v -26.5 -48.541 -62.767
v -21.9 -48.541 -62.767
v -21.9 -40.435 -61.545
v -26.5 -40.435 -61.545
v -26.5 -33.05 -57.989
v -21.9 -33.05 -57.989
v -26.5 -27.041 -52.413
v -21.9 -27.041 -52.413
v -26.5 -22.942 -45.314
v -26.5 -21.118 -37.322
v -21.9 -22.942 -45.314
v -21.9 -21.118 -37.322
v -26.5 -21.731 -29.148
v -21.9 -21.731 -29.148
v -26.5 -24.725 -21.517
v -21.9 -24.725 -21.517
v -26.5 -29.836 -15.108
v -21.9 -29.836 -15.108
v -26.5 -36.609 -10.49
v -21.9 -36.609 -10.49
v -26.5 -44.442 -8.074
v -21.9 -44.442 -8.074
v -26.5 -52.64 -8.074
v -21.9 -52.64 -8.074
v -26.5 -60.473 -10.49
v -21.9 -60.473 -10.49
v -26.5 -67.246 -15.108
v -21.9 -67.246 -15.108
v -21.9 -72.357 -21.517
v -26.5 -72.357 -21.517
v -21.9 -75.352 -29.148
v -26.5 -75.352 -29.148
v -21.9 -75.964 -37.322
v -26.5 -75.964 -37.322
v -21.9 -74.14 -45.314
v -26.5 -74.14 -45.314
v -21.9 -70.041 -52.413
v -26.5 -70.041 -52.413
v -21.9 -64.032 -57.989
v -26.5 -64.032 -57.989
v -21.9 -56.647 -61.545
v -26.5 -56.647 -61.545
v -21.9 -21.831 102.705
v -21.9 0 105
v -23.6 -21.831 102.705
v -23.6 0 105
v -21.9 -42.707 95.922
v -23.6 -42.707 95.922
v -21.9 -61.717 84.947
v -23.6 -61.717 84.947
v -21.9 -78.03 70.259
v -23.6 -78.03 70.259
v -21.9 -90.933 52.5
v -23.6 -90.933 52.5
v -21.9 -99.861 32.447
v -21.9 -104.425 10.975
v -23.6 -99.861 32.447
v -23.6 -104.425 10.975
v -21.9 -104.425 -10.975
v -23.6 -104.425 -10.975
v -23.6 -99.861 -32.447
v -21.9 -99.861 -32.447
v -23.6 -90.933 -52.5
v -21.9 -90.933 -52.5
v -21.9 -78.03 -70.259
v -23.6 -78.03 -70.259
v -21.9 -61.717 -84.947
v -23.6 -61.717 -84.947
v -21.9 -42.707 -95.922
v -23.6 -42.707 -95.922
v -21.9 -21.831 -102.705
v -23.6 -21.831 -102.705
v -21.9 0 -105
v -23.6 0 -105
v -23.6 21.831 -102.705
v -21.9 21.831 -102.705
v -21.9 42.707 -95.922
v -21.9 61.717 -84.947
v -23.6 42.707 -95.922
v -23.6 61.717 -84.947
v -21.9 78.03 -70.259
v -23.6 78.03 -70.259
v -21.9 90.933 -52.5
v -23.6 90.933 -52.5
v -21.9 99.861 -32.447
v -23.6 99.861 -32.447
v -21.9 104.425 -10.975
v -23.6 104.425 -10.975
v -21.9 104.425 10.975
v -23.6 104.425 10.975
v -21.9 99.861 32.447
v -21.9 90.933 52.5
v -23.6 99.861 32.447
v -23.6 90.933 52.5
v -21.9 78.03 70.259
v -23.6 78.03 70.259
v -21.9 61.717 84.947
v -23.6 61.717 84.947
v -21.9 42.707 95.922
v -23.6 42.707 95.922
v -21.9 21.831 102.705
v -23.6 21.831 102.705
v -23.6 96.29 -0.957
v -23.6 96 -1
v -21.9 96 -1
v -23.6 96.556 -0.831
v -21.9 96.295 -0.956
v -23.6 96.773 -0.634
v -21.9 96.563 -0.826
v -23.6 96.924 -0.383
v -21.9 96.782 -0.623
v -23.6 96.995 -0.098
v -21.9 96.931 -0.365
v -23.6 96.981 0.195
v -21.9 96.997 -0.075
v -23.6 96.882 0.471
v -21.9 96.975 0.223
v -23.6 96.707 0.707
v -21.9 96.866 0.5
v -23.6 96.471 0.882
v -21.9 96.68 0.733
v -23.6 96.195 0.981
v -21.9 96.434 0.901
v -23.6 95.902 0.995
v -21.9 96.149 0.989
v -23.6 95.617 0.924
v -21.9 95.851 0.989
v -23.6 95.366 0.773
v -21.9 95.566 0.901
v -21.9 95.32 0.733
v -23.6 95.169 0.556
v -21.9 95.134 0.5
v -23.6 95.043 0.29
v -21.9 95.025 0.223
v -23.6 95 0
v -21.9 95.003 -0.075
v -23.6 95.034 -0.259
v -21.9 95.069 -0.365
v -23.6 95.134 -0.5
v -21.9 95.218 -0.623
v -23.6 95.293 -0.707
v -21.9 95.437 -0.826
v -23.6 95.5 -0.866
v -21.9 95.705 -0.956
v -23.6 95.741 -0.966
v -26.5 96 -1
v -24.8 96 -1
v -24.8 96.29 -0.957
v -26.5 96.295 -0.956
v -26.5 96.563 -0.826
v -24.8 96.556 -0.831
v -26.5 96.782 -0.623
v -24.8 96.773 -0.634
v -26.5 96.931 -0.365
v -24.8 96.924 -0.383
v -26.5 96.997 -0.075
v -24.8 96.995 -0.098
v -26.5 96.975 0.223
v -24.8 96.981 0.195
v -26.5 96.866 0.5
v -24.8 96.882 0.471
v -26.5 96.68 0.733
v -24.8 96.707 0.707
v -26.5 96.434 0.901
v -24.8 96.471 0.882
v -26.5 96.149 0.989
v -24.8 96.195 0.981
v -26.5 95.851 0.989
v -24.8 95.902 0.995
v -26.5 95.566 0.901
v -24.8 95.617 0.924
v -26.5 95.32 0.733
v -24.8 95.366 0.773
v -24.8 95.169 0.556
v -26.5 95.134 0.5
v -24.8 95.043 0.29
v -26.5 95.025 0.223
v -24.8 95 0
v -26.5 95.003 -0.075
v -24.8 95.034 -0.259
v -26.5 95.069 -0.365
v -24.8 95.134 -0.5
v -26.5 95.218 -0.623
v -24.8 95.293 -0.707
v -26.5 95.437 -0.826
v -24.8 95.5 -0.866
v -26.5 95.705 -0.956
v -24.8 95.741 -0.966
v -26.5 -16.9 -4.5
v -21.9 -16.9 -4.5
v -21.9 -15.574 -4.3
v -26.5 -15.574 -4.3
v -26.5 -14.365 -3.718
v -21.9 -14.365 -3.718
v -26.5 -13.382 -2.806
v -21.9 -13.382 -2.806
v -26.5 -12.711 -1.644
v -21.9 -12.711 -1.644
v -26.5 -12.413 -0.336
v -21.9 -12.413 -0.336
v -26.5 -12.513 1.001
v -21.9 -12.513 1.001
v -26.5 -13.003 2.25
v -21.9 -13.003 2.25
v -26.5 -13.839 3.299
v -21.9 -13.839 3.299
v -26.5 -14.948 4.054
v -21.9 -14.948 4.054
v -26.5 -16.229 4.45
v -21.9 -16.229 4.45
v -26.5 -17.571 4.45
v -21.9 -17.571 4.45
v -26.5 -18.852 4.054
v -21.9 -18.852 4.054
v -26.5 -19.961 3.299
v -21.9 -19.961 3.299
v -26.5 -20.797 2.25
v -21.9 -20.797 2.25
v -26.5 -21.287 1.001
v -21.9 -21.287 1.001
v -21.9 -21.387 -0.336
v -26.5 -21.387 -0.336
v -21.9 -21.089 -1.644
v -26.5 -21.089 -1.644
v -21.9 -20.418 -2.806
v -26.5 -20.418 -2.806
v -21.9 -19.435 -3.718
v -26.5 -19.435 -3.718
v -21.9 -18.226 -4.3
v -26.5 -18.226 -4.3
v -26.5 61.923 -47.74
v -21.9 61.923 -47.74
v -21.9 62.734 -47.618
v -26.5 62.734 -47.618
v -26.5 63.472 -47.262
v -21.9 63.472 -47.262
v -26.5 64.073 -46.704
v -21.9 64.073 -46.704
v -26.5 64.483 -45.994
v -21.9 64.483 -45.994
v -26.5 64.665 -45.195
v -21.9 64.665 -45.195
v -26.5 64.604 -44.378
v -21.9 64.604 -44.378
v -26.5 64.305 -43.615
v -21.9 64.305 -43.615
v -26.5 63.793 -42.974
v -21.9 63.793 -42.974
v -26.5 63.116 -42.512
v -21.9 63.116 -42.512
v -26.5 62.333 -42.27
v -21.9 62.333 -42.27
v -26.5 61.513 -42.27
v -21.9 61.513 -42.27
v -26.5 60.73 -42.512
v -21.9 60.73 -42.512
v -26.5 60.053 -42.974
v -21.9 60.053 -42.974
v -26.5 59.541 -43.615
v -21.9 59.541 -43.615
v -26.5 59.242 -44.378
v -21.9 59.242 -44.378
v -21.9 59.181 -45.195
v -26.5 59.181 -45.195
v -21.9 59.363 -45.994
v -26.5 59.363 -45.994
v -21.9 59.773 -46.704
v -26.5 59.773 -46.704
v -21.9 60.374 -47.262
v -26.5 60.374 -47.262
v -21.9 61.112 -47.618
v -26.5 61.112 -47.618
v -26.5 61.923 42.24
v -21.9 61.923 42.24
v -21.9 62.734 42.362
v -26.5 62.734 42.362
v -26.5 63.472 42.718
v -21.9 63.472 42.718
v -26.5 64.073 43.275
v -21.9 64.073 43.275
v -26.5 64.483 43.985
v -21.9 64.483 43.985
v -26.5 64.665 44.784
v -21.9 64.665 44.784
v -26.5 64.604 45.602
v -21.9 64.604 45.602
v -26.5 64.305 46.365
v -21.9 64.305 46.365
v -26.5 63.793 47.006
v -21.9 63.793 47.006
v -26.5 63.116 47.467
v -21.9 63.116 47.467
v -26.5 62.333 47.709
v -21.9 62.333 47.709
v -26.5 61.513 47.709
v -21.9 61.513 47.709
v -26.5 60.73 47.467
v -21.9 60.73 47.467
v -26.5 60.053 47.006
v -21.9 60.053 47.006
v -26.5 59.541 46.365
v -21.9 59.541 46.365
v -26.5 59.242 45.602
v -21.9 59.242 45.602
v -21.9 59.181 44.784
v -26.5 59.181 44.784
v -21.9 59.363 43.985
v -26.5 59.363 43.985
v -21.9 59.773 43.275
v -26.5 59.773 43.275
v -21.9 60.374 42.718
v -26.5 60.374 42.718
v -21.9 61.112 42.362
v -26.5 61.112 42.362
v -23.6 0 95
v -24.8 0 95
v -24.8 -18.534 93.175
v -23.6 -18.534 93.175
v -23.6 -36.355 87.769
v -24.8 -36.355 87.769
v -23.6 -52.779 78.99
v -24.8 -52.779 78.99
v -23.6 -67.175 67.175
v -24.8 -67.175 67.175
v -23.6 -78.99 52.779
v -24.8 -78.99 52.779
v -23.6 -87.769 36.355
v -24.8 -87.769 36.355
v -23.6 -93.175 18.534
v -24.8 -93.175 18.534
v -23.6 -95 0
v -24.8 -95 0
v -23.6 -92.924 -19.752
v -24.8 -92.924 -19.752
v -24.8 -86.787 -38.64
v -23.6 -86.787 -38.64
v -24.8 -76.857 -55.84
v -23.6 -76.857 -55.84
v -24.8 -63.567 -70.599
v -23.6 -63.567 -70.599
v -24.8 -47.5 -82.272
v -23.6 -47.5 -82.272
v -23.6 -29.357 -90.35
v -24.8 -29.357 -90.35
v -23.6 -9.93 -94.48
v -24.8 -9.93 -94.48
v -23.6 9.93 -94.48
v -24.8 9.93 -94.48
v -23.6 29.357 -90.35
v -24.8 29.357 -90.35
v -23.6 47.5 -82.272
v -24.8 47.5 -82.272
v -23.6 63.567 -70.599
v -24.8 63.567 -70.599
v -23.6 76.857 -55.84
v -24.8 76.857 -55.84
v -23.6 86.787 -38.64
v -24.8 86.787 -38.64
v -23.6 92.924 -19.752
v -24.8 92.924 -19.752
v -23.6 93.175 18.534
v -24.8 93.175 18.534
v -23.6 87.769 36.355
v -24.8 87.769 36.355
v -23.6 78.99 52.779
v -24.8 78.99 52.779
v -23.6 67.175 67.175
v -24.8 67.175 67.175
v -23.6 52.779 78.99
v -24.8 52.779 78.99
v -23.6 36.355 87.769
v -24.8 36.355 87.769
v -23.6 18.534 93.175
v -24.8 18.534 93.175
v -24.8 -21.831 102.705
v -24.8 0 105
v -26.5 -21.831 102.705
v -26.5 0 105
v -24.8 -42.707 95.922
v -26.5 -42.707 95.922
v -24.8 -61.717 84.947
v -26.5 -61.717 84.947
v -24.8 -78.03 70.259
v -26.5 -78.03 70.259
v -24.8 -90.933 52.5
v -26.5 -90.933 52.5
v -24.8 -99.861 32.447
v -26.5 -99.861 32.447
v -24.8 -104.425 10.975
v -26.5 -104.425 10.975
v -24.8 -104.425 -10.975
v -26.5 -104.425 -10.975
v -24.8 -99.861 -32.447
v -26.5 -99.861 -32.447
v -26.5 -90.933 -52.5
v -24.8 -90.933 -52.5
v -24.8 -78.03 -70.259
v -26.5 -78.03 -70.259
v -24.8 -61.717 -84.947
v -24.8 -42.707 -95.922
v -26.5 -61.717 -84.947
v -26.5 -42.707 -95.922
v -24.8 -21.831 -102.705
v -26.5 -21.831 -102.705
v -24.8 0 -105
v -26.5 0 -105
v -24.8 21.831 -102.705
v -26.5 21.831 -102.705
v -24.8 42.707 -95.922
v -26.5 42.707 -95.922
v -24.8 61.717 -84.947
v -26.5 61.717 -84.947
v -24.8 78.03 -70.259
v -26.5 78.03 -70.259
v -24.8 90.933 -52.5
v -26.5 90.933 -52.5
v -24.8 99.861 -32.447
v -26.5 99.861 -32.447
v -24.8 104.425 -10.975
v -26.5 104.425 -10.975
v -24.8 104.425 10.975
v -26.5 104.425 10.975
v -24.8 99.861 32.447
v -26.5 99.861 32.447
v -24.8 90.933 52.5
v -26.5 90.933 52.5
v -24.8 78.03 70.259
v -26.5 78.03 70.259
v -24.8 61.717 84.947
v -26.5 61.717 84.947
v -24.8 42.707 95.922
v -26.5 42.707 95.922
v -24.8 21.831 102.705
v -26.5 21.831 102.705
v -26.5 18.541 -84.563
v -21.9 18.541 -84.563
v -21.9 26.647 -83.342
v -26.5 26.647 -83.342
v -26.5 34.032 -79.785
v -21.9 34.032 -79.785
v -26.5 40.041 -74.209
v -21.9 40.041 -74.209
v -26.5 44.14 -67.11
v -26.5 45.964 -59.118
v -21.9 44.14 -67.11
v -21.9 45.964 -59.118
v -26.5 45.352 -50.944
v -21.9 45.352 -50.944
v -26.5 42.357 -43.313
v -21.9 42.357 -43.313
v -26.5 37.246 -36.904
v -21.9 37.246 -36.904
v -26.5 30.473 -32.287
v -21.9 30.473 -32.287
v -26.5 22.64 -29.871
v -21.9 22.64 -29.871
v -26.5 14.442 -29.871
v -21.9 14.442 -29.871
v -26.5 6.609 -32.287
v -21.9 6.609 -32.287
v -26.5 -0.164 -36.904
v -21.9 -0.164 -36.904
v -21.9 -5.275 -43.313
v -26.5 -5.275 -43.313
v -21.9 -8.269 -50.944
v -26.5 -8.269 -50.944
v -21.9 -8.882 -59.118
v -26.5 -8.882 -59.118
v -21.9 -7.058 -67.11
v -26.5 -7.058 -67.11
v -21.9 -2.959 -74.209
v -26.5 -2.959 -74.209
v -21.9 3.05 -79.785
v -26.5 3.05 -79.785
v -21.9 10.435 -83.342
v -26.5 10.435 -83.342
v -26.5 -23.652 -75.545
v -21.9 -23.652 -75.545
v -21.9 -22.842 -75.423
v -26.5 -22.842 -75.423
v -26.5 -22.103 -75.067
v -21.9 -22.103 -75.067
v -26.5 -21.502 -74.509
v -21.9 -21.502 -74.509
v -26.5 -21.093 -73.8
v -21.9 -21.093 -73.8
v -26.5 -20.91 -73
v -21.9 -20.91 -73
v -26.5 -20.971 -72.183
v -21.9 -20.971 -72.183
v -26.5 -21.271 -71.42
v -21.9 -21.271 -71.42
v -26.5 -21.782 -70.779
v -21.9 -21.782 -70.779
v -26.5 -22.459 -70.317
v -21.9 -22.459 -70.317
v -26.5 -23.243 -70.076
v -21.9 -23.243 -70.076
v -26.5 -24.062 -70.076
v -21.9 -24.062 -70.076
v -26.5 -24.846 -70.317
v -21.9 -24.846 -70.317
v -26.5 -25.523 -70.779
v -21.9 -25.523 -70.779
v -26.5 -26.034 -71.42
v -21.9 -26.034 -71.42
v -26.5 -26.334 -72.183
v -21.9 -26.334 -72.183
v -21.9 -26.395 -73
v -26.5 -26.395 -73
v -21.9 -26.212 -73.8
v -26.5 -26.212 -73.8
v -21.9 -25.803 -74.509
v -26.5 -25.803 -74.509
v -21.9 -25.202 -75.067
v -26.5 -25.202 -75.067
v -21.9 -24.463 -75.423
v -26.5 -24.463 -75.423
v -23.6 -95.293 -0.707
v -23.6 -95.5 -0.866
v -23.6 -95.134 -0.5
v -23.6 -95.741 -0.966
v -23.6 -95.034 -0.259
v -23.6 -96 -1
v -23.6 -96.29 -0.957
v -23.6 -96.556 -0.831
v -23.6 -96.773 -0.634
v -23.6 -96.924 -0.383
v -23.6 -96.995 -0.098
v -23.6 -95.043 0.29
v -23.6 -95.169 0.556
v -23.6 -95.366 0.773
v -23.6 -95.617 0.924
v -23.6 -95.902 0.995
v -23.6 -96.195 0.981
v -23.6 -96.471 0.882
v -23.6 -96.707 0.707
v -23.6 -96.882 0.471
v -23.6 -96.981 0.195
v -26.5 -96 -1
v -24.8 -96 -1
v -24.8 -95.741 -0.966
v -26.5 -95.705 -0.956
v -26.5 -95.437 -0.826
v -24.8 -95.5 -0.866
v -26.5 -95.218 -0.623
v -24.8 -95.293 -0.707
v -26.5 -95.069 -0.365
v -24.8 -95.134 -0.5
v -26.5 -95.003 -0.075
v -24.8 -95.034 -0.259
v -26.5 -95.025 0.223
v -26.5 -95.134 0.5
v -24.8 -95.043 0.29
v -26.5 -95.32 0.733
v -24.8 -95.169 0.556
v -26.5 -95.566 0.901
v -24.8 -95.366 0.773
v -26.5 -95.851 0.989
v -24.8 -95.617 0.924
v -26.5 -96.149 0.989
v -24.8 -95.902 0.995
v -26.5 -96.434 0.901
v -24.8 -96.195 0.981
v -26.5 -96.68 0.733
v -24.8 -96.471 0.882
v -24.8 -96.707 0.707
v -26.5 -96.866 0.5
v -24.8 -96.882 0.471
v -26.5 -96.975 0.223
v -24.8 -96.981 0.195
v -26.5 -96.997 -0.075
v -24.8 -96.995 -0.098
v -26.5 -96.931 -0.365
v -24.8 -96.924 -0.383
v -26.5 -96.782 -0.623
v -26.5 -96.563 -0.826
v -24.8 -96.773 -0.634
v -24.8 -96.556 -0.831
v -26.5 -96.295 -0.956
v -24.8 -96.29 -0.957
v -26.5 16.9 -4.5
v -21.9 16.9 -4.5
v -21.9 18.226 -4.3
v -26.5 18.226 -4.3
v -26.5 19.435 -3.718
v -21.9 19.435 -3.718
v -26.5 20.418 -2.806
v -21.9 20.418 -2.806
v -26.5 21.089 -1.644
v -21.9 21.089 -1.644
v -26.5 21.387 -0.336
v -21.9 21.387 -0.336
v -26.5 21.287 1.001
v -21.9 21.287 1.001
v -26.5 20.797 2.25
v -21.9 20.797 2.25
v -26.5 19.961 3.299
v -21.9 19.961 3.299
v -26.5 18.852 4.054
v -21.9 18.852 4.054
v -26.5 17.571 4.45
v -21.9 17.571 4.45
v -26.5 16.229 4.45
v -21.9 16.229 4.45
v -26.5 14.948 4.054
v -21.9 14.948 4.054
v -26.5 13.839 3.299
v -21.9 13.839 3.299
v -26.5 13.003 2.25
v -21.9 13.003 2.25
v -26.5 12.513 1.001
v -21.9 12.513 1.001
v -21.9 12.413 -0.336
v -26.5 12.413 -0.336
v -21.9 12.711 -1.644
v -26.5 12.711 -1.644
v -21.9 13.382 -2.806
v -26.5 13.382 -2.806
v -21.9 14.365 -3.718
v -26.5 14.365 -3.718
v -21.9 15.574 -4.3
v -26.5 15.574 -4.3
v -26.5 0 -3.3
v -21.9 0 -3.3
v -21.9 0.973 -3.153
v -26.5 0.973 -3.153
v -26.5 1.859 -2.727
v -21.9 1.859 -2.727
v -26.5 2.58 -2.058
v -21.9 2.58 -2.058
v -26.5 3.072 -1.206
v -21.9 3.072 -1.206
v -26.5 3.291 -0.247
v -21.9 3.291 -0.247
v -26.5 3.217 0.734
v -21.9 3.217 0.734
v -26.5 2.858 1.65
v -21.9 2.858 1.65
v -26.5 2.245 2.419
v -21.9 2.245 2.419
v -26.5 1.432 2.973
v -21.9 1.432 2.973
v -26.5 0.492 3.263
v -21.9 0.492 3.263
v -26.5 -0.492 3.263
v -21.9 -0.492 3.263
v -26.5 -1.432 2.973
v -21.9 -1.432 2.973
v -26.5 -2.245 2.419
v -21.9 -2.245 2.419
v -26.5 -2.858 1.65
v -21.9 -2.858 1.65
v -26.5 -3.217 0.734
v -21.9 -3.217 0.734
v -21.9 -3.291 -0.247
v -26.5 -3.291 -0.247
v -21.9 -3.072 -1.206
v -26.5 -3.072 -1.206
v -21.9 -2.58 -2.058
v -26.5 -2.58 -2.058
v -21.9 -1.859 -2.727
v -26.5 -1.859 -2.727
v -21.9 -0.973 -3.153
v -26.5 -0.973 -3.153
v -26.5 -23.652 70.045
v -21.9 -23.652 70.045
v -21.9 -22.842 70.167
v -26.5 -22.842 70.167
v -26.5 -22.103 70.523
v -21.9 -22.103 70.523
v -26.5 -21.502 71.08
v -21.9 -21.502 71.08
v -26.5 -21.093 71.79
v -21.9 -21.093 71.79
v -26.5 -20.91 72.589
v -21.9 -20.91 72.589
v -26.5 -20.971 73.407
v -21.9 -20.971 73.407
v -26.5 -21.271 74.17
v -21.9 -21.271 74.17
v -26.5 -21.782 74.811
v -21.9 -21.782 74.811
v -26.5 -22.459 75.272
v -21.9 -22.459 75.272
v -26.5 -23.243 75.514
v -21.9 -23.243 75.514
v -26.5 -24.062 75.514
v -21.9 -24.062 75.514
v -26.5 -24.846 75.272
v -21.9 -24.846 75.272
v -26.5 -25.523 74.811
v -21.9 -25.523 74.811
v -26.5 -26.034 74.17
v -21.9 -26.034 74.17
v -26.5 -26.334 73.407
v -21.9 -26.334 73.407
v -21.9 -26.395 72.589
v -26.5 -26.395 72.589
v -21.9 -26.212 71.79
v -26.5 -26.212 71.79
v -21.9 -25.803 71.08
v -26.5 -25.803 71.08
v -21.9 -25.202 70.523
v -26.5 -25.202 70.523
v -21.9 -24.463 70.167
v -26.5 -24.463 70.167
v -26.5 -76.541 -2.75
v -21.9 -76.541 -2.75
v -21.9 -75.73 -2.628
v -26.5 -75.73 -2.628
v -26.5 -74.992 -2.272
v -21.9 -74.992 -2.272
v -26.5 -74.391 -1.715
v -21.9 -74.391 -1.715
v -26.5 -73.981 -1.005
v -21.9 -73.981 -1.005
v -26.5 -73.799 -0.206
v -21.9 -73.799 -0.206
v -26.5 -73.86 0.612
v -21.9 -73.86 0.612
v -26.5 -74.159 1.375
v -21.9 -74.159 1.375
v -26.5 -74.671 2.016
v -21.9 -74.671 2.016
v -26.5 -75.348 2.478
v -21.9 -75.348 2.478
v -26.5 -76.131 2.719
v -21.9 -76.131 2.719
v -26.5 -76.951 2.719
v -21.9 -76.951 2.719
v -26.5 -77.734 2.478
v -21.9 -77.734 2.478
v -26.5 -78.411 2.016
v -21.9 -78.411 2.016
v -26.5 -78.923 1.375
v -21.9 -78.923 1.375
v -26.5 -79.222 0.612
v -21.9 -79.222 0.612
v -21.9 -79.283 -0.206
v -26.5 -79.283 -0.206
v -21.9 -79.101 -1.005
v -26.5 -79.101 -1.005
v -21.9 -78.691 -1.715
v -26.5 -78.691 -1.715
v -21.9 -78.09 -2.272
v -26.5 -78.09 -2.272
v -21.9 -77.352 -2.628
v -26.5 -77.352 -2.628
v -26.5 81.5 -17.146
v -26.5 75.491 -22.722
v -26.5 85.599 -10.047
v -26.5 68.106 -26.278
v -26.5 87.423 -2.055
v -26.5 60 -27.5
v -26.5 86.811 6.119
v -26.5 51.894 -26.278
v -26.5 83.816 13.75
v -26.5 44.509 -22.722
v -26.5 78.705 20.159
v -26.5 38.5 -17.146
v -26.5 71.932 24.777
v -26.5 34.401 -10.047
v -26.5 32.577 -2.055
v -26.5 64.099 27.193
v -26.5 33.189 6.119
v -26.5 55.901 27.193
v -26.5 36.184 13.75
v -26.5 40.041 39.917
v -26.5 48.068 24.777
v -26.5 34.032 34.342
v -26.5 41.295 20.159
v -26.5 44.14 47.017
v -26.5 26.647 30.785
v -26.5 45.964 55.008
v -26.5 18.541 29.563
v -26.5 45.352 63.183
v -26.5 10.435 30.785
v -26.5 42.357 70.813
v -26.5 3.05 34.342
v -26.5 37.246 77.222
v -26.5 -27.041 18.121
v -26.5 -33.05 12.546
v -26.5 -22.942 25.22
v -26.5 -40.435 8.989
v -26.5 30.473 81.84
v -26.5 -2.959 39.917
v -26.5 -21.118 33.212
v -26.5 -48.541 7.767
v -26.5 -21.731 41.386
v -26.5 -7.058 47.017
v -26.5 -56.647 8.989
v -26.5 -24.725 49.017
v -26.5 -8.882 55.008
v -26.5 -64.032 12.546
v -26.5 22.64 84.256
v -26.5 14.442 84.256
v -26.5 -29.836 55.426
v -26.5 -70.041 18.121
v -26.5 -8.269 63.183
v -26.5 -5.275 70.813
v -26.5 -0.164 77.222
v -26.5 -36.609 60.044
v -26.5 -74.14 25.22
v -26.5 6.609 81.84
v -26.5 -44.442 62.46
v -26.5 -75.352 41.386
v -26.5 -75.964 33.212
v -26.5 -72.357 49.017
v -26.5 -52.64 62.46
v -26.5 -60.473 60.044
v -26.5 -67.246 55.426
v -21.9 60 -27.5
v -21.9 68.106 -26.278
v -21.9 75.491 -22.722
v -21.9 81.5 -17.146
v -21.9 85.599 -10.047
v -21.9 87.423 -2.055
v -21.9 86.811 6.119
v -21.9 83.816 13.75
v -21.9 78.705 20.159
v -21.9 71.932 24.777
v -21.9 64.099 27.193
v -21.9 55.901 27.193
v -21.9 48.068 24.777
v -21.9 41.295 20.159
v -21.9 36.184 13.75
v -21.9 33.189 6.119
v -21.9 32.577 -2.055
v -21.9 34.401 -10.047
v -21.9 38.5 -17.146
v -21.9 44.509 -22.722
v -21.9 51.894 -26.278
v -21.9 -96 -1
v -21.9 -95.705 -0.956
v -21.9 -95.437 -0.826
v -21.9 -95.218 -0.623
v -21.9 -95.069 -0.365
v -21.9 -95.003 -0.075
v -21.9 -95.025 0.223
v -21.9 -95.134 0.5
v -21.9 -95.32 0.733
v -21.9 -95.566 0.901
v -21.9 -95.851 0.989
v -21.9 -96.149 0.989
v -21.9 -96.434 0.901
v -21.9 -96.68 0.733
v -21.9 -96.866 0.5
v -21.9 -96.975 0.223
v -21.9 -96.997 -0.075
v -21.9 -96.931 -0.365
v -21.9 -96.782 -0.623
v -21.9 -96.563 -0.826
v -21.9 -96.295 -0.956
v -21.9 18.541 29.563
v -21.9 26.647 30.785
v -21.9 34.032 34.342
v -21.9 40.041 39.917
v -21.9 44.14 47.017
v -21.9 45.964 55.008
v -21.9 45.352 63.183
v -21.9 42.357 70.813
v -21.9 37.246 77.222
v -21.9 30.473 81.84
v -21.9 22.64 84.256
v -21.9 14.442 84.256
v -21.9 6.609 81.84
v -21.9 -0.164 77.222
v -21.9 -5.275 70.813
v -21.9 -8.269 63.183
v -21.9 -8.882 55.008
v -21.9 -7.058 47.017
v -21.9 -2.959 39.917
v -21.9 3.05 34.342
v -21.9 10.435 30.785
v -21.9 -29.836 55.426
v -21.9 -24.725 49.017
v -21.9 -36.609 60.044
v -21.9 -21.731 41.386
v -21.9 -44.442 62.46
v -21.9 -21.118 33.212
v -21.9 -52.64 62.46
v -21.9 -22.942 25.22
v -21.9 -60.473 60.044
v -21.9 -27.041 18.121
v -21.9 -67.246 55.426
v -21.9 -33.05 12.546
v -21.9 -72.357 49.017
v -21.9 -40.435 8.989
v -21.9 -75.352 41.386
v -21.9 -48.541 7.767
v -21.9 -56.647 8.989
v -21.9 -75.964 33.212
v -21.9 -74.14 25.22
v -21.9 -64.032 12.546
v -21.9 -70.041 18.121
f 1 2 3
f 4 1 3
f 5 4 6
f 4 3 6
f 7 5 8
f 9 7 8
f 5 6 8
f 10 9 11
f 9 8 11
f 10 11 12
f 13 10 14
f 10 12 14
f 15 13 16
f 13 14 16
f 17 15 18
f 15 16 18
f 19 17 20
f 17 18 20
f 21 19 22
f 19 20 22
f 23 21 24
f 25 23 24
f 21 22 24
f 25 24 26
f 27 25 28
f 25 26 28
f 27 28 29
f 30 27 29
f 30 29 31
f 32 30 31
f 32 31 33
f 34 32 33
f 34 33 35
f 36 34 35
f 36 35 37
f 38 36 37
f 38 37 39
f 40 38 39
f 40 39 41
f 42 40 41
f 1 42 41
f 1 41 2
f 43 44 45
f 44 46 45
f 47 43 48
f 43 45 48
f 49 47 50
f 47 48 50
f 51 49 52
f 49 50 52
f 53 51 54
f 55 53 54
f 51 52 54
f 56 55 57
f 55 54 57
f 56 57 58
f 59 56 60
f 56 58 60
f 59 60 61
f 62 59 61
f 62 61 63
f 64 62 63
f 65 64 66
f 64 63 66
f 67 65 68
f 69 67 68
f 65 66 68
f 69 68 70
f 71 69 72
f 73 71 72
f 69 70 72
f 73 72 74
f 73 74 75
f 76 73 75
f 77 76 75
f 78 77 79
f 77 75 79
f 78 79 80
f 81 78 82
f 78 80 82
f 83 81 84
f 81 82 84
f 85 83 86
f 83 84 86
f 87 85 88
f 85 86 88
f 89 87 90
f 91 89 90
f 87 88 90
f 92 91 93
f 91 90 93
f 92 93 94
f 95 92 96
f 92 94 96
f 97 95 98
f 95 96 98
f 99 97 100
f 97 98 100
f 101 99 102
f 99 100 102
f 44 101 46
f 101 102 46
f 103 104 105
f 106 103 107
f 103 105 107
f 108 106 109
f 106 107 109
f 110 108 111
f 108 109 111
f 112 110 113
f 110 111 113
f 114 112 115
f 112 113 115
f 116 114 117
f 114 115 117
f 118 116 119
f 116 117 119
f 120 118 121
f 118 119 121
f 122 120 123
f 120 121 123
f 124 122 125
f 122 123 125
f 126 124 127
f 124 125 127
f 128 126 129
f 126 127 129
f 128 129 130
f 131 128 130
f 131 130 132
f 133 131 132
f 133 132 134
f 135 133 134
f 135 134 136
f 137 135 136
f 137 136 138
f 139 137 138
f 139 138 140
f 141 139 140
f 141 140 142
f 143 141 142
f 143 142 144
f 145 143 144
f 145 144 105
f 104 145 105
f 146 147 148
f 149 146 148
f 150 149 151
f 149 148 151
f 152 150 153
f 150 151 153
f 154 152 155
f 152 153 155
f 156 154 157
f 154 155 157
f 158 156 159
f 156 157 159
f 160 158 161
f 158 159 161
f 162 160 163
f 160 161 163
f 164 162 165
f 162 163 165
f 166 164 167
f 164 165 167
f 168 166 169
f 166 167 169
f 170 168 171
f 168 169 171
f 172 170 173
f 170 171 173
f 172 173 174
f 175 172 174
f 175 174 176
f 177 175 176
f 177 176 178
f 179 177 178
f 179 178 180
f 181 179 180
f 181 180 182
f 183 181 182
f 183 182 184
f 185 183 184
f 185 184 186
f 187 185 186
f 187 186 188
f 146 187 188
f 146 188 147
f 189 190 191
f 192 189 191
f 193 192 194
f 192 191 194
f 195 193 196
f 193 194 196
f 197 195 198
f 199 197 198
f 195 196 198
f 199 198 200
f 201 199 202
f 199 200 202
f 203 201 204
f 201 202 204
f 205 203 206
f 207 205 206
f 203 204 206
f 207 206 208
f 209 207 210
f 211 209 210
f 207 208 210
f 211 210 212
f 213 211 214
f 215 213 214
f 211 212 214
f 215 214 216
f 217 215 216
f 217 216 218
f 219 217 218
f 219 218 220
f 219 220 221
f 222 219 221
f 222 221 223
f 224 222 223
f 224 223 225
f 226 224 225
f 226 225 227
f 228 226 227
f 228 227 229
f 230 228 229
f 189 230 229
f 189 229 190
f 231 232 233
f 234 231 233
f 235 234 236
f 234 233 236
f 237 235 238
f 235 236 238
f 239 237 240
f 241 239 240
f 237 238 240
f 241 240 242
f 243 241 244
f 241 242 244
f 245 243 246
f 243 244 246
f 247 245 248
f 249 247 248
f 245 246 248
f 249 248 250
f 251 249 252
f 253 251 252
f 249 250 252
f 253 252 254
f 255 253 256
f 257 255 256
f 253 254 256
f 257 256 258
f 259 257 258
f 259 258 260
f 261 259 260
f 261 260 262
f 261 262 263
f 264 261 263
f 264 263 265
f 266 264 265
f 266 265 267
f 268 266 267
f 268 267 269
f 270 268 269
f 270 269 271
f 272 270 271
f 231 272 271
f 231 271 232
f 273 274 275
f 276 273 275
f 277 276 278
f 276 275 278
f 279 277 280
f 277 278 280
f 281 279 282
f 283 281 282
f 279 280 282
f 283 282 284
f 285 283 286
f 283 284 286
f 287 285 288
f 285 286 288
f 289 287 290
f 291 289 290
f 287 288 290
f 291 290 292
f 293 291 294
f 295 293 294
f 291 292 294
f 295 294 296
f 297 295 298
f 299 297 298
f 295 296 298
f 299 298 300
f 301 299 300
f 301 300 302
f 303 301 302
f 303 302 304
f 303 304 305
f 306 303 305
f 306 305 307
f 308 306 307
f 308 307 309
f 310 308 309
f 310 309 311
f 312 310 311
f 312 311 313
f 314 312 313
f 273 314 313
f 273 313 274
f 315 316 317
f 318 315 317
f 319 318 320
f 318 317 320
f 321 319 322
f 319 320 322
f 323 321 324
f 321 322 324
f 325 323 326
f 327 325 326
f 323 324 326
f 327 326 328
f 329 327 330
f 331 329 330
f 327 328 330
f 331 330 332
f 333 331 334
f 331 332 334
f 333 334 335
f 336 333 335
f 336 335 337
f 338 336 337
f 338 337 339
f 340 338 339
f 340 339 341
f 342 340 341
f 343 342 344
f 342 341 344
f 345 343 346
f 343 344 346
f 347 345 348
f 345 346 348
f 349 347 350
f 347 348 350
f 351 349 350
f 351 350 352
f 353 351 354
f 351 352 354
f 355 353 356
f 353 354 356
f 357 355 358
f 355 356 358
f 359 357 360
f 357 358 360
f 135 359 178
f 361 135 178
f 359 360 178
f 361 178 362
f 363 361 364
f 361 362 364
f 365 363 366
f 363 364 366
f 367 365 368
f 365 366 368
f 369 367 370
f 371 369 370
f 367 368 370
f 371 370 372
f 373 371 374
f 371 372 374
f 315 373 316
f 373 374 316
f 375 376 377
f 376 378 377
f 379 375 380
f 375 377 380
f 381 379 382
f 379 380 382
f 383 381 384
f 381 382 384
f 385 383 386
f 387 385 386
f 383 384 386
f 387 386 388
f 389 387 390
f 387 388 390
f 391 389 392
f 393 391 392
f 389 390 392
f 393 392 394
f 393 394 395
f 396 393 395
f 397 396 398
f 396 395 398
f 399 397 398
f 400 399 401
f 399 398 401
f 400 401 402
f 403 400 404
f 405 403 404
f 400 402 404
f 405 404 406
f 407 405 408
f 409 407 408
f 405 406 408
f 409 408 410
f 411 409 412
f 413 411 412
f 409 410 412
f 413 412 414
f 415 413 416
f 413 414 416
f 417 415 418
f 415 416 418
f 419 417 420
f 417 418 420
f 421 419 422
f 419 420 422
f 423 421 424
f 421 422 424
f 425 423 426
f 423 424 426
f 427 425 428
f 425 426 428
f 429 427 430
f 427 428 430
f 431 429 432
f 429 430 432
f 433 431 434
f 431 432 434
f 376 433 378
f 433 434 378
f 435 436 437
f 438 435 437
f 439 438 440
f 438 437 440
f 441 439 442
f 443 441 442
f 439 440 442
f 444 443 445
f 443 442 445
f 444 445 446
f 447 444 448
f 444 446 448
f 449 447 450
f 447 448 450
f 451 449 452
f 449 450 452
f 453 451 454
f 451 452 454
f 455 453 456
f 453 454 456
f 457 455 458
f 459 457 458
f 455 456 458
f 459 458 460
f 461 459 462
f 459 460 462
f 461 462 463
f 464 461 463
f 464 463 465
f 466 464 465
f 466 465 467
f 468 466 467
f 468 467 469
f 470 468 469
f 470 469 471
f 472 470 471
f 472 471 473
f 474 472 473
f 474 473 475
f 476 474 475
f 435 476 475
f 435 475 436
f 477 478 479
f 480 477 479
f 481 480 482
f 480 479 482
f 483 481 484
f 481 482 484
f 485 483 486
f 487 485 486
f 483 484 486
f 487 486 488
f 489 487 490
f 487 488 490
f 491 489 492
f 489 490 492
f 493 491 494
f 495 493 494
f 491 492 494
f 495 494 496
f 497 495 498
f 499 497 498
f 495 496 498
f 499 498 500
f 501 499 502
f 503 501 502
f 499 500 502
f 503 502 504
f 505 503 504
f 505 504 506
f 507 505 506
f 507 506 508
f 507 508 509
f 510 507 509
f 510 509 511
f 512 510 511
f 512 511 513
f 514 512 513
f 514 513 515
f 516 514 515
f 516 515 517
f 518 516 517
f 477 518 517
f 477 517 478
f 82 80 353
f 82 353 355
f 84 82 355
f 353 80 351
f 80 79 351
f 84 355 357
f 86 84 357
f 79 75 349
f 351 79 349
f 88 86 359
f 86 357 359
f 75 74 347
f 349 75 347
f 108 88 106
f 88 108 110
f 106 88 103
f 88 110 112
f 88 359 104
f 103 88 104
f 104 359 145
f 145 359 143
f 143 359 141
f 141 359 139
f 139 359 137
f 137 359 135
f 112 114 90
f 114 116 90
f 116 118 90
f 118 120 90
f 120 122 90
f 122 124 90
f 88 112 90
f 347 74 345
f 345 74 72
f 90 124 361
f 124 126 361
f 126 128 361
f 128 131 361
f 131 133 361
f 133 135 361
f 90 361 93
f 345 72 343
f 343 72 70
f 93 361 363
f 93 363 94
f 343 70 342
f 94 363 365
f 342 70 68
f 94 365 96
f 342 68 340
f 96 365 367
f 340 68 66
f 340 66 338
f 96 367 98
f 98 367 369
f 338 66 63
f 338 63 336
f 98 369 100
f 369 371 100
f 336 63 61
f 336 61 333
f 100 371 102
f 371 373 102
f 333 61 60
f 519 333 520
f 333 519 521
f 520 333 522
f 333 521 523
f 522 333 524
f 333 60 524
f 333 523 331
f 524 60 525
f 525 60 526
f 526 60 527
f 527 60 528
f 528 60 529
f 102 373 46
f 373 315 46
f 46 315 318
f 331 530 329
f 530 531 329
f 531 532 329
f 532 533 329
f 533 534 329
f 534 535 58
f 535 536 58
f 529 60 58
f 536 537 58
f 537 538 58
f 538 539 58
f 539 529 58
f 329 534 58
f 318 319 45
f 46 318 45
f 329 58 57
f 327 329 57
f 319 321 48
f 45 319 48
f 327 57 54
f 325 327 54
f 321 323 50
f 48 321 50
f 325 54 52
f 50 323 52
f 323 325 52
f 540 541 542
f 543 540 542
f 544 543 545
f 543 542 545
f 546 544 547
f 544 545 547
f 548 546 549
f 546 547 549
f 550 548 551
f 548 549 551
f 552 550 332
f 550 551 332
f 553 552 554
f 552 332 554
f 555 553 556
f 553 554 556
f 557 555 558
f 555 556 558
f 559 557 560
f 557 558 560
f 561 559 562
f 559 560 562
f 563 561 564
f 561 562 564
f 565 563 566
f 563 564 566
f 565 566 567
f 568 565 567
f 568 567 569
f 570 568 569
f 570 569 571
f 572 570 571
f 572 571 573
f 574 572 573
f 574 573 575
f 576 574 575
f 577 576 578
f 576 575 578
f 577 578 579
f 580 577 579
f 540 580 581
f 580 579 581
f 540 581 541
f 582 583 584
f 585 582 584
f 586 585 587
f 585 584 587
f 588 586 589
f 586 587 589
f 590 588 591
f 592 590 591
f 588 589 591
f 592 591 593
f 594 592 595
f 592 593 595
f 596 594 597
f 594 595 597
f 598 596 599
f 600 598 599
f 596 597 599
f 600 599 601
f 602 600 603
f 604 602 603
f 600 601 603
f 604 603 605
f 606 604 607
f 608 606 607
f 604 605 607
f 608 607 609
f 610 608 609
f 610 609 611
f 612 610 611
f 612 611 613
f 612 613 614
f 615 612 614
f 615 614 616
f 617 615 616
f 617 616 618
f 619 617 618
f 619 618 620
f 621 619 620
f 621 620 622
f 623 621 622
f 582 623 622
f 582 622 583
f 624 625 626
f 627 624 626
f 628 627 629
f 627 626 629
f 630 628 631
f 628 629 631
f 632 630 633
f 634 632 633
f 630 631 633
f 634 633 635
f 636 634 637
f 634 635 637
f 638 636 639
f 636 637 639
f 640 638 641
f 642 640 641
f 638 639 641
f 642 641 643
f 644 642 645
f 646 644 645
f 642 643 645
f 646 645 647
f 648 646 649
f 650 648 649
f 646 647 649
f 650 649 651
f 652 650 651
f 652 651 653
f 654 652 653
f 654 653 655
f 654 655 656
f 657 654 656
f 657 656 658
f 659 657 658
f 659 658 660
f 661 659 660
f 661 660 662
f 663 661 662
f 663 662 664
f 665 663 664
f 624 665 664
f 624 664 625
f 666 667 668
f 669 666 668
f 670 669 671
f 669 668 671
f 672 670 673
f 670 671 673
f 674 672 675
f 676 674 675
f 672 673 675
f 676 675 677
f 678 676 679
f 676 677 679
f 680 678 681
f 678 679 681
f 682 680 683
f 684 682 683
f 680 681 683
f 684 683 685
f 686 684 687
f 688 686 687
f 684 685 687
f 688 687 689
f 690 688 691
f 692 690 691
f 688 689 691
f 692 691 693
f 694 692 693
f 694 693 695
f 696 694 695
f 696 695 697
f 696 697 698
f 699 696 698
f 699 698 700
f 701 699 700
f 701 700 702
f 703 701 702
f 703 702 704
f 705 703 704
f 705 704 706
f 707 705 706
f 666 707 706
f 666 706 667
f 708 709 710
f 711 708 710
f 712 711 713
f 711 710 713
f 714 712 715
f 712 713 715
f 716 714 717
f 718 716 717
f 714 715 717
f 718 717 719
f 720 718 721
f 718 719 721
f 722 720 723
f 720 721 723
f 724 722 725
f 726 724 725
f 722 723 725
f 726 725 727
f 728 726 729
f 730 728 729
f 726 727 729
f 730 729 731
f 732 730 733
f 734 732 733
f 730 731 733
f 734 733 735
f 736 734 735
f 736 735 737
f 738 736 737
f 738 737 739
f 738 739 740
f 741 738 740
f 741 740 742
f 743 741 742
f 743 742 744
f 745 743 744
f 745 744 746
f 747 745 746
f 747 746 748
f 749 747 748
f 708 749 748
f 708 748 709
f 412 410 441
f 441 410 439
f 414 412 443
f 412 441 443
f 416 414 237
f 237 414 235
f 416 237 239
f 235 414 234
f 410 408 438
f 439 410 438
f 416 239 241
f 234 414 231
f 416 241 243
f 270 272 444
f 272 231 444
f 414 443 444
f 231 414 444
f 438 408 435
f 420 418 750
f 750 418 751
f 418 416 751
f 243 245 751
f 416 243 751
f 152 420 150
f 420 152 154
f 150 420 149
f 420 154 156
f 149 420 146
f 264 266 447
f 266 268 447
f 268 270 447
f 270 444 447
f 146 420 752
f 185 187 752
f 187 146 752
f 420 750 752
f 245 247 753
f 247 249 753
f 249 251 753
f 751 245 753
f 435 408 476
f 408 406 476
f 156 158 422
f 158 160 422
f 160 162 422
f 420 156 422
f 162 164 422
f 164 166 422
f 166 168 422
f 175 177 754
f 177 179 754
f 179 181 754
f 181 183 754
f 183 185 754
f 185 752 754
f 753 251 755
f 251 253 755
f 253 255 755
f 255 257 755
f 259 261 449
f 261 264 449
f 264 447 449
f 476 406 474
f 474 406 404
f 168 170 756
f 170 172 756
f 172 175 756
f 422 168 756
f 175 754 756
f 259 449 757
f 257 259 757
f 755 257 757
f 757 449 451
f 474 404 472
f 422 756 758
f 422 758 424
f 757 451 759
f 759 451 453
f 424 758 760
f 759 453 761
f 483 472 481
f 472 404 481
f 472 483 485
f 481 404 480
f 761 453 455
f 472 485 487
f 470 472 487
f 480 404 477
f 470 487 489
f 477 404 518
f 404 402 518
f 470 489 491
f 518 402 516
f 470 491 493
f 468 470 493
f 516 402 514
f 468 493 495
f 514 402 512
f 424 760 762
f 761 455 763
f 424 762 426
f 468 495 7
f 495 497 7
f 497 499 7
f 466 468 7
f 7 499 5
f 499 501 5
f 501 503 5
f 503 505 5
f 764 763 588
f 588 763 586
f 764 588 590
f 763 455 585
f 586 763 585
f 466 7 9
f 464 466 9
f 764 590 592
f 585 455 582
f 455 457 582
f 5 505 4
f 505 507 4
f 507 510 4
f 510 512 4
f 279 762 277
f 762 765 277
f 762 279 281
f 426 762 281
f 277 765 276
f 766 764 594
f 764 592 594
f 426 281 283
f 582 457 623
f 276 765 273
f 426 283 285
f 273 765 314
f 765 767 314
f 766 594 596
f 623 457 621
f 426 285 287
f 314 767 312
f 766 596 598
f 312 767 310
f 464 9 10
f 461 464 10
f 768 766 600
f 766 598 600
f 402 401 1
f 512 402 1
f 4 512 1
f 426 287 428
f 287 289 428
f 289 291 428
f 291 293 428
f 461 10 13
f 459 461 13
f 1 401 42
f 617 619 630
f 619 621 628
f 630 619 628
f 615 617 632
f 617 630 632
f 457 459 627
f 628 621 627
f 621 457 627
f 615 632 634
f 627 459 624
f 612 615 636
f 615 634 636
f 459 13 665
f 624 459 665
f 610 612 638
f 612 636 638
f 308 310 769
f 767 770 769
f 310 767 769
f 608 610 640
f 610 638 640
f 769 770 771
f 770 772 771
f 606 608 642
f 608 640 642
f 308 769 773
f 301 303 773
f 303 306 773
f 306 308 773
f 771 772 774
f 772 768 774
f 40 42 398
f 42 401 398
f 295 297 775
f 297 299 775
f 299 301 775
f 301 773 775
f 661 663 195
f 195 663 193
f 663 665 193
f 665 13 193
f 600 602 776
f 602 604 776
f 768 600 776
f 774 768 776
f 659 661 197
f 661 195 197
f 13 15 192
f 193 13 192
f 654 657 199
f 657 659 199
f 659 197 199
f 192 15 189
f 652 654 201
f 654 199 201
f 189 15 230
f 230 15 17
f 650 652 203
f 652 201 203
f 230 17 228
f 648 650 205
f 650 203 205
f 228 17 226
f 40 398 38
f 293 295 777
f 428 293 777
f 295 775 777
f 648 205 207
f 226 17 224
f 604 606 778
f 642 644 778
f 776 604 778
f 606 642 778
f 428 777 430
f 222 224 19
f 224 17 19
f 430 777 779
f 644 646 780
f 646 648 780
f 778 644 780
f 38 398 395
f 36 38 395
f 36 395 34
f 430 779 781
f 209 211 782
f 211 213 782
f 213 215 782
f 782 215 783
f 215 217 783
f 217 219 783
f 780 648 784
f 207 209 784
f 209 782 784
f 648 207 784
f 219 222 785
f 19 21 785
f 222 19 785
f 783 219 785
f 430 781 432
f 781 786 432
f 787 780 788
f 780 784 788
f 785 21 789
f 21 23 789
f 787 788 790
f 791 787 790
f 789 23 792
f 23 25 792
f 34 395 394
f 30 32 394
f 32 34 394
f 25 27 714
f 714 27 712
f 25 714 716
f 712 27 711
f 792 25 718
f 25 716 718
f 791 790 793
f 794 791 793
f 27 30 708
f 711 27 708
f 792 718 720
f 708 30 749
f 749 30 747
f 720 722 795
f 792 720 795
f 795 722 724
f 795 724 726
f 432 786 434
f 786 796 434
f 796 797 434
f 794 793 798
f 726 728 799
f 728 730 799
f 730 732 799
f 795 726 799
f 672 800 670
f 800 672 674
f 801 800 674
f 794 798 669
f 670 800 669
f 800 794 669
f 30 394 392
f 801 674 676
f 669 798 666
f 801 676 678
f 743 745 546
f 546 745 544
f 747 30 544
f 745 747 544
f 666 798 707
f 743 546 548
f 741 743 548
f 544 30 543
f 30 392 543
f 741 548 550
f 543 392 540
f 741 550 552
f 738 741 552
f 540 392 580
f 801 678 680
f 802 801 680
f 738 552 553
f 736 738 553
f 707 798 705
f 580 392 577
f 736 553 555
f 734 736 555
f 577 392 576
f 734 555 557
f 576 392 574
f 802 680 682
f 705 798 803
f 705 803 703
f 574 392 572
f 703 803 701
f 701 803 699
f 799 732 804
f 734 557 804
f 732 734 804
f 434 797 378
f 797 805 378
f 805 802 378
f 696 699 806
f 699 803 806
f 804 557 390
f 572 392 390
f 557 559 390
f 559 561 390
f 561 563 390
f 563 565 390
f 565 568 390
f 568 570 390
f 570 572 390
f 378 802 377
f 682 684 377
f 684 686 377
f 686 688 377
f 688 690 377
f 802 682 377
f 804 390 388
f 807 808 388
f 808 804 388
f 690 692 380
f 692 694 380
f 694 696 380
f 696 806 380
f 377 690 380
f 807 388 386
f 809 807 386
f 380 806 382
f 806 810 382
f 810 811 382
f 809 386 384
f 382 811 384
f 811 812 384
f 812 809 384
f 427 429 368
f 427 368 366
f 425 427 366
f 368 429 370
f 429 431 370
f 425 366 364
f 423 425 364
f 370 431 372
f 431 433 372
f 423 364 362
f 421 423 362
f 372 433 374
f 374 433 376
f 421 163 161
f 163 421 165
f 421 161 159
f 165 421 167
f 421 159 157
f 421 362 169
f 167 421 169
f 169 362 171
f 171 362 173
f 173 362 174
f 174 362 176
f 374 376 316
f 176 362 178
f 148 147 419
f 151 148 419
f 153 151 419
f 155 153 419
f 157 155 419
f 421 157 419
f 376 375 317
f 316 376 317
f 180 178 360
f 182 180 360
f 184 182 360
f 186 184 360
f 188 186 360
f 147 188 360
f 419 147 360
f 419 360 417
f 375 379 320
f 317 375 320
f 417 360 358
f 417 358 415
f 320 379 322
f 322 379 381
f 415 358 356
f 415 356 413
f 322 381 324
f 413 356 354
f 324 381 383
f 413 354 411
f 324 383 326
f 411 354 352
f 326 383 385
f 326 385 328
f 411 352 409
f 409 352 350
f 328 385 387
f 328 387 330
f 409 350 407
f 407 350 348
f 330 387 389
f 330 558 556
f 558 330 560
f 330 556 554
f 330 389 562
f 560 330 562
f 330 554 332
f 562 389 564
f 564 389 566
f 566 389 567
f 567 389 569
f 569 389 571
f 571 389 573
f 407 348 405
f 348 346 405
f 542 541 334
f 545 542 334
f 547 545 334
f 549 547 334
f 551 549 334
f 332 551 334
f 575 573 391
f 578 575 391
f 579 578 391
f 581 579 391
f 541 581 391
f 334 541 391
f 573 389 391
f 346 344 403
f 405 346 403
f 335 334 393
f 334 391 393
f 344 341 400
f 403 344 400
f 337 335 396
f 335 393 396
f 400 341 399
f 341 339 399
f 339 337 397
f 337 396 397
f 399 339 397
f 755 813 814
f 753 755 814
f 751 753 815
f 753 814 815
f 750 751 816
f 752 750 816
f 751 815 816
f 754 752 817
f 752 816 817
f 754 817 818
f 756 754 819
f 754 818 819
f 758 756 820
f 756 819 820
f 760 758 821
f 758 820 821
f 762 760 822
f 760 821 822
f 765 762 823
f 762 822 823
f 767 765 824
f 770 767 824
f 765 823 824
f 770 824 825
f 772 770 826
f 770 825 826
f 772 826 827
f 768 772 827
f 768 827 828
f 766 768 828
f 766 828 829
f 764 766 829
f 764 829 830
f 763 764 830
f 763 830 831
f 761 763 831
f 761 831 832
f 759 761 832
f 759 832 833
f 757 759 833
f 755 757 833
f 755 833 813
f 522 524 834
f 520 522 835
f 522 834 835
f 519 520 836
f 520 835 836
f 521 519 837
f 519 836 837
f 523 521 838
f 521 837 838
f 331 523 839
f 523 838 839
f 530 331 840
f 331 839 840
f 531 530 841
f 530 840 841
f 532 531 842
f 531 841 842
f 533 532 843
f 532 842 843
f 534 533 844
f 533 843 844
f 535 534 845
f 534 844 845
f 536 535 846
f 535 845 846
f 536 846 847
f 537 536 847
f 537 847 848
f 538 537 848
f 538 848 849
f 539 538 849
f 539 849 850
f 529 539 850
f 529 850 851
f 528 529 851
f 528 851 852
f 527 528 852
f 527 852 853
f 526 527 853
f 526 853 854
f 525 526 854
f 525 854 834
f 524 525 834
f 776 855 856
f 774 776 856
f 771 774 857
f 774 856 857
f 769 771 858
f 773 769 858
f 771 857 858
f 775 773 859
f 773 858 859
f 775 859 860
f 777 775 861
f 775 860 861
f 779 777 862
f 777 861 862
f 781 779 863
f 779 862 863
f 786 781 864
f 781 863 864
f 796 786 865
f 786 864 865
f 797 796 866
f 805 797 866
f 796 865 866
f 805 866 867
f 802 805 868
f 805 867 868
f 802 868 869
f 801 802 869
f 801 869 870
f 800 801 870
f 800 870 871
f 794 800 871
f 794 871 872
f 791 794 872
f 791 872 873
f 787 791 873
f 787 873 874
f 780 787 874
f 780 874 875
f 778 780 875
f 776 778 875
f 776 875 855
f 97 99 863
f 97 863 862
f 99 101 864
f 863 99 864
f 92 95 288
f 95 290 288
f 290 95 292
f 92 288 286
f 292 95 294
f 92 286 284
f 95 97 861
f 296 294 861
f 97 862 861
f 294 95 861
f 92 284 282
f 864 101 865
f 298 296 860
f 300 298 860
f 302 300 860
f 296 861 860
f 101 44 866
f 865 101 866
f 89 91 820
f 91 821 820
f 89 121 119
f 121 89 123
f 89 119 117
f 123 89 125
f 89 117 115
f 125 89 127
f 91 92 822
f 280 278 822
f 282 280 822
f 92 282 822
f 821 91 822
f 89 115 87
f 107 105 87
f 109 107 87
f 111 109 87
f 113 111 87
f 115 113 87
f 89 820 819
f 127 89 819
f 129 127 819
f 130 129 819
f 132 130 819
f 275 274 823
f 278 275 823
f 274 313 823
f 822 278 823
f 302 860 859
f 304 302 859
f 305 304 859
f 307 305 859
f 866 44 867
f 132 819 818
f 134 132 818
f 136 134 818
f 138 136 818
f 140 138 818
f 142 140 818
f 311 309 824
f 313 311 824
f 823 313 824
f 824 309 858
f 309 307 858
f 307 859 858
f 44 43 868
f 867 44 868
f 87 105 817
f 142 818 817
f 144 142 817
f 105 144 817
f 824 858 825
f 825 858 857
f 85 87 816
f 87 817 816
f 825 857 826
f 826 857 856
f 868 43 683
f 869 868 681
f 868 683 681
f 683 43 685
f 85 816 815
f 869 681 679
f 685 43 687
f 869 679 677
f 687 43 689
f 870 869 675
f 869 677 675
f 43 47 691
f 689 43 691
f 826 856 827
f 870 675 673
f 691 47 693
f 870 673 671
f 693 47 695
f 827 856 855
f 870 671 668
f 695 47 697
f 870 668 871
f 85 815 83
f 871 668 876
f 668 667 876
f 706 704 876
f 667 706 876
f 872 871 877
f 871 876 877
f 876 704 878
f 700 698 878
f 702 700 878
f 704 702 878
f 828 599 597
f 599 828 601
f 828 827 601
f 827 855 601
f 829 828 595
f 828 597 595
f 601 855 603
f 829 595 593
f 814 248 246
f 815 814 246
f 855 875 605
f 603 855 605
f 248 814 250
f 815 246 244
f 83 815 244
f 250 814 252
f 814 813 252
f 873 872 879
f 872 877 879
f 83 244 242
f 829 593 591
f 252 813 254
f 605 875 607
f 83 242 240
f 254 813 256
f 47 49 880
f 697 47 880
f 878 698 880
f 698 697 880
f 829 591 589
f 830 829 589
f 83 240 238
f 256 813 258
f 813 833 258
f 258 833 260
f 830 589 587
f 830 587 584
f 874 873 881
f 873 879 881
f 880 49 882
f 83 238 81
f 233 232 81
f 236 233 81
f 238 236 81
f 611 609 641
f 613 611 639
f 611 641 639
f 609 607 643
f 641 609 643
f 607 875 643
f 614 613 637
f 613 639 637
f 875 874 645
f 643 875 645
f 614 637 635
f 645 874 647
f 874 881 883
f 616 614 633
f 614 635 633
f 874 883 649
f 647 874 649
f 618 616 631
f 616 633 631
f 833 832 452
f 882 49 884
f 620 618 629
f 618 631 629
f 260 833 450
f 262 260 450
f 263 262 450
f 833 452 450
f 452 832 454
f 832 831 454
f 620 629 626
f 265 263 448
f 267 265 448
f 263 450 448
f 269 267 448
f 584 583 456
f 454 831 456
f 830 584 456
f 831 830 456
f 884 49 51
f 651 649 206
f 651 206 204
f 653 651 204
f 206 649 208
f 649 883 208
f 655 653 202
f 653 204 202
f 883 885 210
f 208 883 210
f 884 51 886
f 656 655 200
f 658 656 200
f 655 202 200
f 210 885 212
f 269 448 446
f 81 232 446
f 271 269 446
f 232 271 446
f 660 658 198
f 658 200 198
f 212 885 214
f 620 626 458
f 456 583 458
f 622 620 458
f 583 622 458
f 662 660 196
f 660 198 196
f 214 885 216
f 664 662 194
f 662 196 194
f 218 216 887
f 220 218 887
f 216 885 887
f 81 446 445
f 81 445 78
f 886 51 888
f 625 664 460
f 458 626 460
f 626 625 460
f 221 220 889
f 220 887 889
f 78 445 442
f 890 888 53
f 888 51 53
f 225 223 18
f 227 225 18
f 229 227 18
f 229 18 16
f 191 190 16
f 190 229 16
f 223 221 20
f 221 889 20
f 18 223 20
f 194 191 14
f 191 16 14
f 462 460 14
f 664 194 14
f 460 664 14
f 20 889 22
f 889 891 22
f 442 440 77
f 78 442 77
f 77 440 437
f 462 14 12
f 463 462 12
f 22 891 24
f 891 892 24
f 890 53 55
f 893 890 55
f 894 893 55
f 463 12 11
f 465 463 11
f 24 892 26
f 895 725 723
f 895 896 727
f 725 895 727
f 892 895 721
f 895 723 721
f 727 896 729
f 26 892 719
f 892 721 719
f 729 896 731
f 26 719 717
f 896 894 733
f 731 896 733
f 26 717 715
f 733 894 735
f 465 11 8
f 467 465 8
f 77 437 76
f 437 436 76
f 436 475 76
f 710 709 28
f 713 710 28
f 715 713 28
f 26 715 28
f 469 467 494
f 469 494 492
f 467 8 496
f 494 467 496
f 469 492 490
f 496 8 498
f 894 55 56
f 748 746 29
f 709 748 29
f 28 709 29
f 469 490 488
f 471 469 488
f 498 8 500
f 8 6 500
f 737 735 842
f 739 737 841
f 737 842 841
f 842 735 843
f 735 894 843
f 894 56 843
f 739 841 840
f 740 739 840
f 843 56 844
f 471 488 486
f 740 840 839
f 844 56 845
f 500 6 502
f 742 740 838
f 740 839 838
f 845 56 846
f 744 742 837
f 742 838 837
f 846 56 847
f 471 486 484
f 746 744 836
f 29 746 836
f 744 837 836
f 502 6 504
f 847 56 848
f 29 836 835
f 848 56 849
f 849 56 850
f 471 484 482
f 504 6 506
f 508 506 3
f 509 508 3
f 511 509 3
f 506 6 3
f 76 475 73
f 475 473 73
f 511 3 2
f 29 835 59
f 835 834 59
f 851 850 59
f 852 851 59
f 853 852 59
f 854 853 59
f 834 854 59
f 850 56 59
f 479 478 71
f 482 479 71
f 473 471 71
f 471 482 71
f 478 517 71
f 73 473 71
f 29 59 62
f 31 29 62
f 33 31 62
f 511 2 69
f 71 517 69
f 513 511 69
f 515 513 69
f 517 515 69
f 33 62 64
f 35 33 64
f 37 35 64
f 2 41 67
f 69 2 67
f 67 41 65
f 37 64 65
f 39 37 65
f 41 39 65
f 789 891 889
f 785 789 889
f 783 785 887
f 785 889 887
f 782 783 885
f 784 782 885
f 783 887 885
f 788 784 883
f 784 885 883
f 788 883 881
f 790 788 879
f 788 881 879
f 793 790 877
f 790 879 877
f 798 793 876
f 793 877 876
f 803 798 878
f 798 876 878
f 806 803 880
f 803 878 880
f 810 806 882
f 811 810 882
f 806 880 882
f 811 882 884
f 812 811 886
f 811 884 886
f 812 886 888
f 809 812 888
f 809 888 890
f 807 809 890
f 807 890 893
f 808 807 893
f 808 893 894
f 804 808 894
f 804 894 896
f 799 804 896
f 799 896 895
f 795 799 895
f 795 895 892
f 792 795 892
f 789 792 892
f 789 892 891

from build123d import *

# Parameters (mm, degrees)
SKETCH_22_R         = 3.3
SKETCH_22_R_2       = 4.5
SKETCH_22_R_3       = 1
SKETCH_22_R_4       = 27.5
SKETCH_22_R_5       = 2.75
CUT_EXTRUDE_1_DEPTH = 10


with BuildPart() as part:
    # 草图1 → 旋转1 (revolve)
    with BuildSketch(Plane.XY, mode=Mode.PRIVATE) as revolve_1_sk:
        Polygon((-21.9, 11), (-21.9, 25), (-21.9, 105), (-23, 105), (-23.6, 105), (-23.6, 95), (-24.2, 95), (-24.8, 95), (-24.8, 105), (-25, 105), (-26.5, 105), (-26.5, 98.307417596), (-26.5, 11), (-26.5, 0), (-21.9, 0), align=None)
    revolve(revolve_1_sk.sketch.rotate(Axis((-21, 0, 0), (1, 0, 0)), 90), axis=Axis((-21, 0, 0), (1, 0, 0)))

    # 草图22 → 切除-拉伸1 (cut)
    with BuildSketch(Plane(origin=(-21.9, 0, 0), x_dir=(0, 0, -1), z_dir=(1, 0, 0))):
        Circle(SKETCH_22_R)
        with Locations((0, 16.9)):
            Circle(SKETCH_22_R_2)
        with Locations((0, 96)):
            Circle(SKETCH_22_R_3)
        with Locations((0, 60)):
            Circle(SKETCH_22_R_4)
        with Locations((0, -16.9)):
            Circle(SKETCH_22_R_2)
        with Locations((57.063390978, 18.541019662)):
            Circle(SKETCH_22_R_4)
        with Locations((72.794835514, -23.652475842)):
            Circle(SKETCH_22_R_5)
        with Locations((35.267115138, -48.541019662)):
            Circle(SKETCH_22_R_4)
        with Locations((-35.267115138, -48.541019662)):
            Circle(SKETCH_22_R_4)
        with Locations((-57.063390978, 18.541019662)):
            Circle(SKETCH_22_R_4)
        with Locations((0, -96)):
            Circle(SKETCH_22_R_3)
        with Locations((0, -76.541019662)):
            Circle(SKETCH_22_R_5)
        with Locations((-72.794835514, -23.652475842)):
            Circle(SKETCH_22_R_5)
        with Locations((-44.989682553, 61.922985674)):
            Circle(SKETCH_22_R_5)
        with Locations((44.989682553, 61.922985674)):
            Circle(SKETCH_22_R_5)
    extrude(amount=-CUT_EXTRUDE_1_DEPTH, mode=Mode.SUBTRACT)


solid = part.part
